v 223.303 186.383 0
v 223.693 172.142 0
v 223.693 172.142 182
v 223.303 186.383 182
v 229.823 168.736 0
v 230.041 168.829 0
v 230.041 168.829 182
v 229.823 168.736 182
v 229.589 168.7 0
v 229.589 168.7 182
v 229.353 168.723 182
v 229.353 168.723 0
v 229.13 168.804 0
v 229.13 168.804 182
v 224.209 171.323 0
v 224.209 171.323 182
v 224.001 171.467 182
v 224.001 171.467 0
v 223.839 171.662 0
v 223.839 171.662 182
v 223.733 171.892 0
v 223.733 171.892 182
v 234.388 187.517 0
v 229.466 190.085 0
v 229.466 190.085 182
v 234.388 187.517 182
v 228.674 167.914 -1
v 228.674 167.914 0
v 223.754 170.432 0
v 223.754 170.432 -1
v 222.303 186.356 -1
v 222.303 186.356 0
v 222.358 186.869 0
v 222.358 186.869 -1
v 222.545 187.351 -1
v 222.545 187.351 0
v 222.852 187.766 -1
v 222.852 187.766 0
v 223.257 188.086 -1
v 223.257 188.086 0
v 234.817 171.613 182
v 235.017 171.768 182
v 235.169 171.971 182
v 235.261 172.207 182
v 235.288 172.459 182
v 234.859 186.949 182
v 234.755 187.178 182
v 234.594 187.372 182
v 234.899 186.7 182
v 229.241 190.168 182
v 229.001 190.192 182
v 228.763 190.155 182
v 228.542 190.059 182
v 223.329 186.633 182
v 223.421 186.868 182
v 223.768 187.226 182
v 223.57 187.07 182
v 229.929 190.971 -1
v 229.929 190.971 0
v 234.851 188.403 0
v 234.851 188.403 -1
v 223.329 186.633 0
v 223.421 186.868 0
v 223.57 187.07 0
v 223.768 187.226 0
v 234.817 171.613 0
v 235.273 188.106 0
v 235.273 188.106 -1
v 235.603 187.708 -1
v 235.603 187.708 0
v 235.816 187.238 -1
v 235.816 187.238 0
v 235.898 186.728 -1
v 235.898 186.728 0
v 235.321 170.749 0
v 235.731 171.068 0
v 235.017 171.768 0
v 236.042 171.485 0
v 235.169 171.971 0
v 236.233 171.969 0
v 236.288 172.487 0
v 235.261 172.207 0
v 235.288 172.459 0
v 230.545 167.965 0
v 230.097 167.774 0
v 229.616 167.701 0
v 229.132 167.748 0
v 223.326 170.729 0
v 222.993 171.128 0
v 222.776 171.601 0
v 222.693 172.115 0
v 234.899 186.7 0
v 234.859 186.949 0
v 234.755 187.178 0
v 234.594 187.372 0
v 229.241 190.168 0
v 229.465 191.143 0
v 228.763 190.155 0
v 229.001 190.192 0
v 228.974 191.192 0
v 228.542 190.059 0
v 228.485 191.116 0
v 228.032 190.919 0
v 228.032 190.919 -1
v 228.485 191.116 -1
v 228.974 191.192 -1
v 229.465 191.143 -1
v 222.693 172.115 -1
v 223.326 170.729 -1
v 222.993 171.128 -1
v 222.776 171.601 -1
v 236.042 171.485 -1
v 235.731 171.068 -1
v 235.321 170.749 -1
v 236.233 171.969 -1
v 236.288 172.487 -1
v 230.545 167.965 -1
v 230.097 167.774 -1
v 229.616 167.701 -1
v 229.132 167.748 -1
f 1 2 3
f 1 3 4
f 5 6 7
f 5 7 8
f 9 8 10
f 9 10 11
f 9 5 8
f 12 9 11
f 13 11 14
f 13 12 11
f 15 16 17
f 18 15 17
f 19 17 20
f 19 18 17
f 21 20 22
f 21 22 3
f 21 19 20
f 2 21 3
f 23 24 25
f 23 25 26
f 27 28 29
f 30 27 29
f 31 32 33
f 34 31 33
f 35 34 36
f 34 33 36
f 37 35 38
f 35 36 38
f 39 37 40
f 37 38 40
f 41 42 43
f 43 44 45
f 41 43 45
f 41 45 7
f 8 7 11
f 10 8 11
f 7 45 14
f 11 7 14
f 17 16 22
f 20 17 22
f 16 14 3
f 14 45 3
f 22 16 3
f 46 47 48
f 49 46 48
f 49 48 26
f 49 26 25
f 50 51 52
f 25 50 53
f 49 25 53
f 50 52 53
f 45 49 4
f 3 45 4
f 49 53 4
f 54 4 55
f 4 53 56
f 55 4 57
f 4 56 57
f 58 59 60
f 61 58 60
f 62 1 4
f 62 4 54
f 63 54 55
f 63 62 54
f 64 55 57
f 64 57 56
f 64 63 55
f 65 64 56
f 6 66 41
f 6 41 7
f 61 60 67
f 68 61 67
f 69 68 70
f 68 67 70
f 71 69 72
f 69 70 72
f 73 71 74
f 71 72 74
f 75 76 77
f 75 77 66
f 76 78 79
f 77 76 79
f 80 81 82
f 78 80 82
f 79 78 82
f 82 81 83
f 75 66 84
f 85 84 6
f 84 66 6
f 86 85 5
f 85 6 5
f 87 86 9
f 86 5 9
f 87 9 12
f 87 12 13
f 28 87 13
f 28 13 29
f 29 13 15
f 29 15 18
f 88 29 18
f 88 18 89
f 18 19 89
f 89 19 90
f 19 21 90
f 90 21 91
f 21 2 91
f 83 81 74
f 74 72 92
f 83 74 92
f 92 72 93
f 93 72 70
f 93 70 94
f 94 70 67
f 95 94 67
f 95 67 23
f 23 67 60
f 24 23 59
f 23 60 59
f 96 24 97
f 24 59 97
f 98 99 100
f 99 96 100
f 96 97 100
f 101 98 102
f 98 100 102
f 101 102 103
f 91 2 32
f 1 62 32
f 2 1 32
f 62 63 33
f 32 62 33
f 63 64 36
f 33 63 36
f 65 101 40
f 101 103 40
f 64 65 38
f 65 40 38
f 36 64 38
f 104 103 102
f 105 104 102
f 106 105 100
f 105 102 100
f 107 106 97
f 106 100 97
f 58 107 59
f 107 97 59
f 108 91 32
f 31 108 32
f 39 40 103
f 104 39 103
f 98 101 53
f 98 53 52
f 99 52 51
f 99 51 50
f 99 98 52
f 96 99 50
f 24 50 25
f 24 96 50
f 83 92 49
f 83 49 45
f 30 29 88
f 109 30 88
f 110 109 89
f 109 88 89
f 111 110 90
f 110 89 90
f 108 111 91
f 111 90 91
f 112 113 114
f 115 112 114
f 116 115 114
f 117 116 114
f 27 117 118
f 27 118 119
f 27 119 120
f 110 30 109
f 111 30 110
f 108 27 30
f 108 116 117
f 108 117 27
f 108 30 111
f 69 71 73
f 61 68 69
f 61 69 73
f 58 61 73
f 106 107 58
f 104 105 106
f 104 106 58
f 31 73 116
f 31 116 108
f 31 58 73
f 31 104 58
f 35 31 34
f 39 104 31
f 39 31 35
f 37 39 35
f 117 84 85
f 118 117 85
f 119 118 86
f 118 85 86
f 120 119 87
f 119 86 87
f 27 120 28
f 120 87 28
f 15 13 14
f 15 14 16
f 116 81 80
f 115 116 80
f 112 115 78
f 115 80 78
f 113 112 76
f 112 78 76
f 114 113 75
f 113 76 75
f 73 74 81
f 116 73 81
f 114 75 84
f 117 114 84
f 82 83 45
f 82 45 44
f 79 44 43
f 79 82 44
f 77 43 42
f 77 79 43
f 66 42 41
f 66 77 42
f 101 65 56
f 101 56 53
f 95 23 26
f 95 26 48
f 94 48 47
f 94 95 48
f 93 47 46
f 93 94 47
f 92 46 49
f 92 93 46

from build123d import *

# Parameters (mm, degrees)
BOSS_EXTRUDE1_DEPTH = 182
BOSS_EXTRUDE2_DEPTH = 1


with BuildPart() as part:
    # Sketch1 → Boss-Extrude1 (new body)
    with BuildSketch(Plane.XY):
        with BuildLine():
            Line((229.466385633, 190.084774284), (234.388449239, 187.516604015))
            ThreePointArc((234.388449239, 187.516604015), (234.754582519, 187.177871366), (234.898637882, 186.70033452))
            Line((234.898637882, 186.70033452), (235.288181443, 172.459456354))
            ThreePointArc((235.288181443, 172.459456354), (235.168635365, 171.971488379), (234.816933894, 171.612726503))
            Line((234.816933894, 171.612726503), (230.041262707, 168.829103536))
            ThreePointArc((230.041262707, 168.829103536), (229.588841957, 168.700212112), (229.130051641, 168.80417836))
            Line((229.130051641, 168.80417836), (224.209349738, 171.322567703))
            ThreePointArc((224.209349738, 171.322567703), (223.838561786, 171.661566677), (223.692518777, 172.142269754))
            Line((223.692518777, 172.142269754), (223.302975216, 186.383147919))
            ThreePointArc((223.302975216, 186.383147919), (223.420709707, 186.867845739), (223.767778026, 187.226087233))
            Line((223.767778026, 187.226087233), (228.542087512, 190.059491125))
            ThreePointArc((228.542087512, 190.059491125), (229.000953, 190.192173087), (229.466385633, 190.084774284))
        make_face()
    extrude(amount=BOSS_EXTRUDE1_DEPTH)

    # Sketch5 → Boss-Extrude2 (add)
    with BuildSketch(Plane(origin=(0, 0, 0), x_dir=(-1, 0, 0), z_dir=(0, 0, -1))):
        with BuildLine():
            Line((-229.928971048, 190.971349003), (-234.851034654, 188.403178734))
            ThreePointArc((-234.851034654, 188.403178734), (-235.602571388, 187.707885402), (-235.898263974, 186.727678192))
            Line((-235.898263974, 186.727678192), (-236.287807535, 172.486800026))
            ThreePointArc((-236.287807535, 172.486800026), (-236.04242348, 171.485181553), (-235.320509935, 170.748775595))
            Line((-235.320509935, 170.748775595), (-230.544838748, 167.965152629))
            ThreePointArc((-230.544838748, 167.965152629), (-229.616185629, 167.70058602), (-228.67445814, 167.913990424))
            Line((-228.67445814, 167.913990424), (-223.753756236, 170.432379767))
            ThreePointArc((-223.753756236, 170.432379767), (-222.992665178, 171.128219765), (-222.692892685, 172.114926081))
            Line((-222.692892685, 172.114926081), (-222.303349124, 186.355804247))
            ThreePointArc((-222.303349124, 186.355804247), (-222.545014659, 187.350710298), (-223.257418051, 188.086048102))
            Line((-223.257418051, 188.086048102), (-228.031727536, 190.919451994))
            ThreePointArc((-228.031727536, 190.919451994), (-228.973609327, 191.191799179), (-229.928971048, 190.971349003))
        make_face()
    extrude(amount=BOSS_EXTRUDE2_DEPTH)


solid = part.part
